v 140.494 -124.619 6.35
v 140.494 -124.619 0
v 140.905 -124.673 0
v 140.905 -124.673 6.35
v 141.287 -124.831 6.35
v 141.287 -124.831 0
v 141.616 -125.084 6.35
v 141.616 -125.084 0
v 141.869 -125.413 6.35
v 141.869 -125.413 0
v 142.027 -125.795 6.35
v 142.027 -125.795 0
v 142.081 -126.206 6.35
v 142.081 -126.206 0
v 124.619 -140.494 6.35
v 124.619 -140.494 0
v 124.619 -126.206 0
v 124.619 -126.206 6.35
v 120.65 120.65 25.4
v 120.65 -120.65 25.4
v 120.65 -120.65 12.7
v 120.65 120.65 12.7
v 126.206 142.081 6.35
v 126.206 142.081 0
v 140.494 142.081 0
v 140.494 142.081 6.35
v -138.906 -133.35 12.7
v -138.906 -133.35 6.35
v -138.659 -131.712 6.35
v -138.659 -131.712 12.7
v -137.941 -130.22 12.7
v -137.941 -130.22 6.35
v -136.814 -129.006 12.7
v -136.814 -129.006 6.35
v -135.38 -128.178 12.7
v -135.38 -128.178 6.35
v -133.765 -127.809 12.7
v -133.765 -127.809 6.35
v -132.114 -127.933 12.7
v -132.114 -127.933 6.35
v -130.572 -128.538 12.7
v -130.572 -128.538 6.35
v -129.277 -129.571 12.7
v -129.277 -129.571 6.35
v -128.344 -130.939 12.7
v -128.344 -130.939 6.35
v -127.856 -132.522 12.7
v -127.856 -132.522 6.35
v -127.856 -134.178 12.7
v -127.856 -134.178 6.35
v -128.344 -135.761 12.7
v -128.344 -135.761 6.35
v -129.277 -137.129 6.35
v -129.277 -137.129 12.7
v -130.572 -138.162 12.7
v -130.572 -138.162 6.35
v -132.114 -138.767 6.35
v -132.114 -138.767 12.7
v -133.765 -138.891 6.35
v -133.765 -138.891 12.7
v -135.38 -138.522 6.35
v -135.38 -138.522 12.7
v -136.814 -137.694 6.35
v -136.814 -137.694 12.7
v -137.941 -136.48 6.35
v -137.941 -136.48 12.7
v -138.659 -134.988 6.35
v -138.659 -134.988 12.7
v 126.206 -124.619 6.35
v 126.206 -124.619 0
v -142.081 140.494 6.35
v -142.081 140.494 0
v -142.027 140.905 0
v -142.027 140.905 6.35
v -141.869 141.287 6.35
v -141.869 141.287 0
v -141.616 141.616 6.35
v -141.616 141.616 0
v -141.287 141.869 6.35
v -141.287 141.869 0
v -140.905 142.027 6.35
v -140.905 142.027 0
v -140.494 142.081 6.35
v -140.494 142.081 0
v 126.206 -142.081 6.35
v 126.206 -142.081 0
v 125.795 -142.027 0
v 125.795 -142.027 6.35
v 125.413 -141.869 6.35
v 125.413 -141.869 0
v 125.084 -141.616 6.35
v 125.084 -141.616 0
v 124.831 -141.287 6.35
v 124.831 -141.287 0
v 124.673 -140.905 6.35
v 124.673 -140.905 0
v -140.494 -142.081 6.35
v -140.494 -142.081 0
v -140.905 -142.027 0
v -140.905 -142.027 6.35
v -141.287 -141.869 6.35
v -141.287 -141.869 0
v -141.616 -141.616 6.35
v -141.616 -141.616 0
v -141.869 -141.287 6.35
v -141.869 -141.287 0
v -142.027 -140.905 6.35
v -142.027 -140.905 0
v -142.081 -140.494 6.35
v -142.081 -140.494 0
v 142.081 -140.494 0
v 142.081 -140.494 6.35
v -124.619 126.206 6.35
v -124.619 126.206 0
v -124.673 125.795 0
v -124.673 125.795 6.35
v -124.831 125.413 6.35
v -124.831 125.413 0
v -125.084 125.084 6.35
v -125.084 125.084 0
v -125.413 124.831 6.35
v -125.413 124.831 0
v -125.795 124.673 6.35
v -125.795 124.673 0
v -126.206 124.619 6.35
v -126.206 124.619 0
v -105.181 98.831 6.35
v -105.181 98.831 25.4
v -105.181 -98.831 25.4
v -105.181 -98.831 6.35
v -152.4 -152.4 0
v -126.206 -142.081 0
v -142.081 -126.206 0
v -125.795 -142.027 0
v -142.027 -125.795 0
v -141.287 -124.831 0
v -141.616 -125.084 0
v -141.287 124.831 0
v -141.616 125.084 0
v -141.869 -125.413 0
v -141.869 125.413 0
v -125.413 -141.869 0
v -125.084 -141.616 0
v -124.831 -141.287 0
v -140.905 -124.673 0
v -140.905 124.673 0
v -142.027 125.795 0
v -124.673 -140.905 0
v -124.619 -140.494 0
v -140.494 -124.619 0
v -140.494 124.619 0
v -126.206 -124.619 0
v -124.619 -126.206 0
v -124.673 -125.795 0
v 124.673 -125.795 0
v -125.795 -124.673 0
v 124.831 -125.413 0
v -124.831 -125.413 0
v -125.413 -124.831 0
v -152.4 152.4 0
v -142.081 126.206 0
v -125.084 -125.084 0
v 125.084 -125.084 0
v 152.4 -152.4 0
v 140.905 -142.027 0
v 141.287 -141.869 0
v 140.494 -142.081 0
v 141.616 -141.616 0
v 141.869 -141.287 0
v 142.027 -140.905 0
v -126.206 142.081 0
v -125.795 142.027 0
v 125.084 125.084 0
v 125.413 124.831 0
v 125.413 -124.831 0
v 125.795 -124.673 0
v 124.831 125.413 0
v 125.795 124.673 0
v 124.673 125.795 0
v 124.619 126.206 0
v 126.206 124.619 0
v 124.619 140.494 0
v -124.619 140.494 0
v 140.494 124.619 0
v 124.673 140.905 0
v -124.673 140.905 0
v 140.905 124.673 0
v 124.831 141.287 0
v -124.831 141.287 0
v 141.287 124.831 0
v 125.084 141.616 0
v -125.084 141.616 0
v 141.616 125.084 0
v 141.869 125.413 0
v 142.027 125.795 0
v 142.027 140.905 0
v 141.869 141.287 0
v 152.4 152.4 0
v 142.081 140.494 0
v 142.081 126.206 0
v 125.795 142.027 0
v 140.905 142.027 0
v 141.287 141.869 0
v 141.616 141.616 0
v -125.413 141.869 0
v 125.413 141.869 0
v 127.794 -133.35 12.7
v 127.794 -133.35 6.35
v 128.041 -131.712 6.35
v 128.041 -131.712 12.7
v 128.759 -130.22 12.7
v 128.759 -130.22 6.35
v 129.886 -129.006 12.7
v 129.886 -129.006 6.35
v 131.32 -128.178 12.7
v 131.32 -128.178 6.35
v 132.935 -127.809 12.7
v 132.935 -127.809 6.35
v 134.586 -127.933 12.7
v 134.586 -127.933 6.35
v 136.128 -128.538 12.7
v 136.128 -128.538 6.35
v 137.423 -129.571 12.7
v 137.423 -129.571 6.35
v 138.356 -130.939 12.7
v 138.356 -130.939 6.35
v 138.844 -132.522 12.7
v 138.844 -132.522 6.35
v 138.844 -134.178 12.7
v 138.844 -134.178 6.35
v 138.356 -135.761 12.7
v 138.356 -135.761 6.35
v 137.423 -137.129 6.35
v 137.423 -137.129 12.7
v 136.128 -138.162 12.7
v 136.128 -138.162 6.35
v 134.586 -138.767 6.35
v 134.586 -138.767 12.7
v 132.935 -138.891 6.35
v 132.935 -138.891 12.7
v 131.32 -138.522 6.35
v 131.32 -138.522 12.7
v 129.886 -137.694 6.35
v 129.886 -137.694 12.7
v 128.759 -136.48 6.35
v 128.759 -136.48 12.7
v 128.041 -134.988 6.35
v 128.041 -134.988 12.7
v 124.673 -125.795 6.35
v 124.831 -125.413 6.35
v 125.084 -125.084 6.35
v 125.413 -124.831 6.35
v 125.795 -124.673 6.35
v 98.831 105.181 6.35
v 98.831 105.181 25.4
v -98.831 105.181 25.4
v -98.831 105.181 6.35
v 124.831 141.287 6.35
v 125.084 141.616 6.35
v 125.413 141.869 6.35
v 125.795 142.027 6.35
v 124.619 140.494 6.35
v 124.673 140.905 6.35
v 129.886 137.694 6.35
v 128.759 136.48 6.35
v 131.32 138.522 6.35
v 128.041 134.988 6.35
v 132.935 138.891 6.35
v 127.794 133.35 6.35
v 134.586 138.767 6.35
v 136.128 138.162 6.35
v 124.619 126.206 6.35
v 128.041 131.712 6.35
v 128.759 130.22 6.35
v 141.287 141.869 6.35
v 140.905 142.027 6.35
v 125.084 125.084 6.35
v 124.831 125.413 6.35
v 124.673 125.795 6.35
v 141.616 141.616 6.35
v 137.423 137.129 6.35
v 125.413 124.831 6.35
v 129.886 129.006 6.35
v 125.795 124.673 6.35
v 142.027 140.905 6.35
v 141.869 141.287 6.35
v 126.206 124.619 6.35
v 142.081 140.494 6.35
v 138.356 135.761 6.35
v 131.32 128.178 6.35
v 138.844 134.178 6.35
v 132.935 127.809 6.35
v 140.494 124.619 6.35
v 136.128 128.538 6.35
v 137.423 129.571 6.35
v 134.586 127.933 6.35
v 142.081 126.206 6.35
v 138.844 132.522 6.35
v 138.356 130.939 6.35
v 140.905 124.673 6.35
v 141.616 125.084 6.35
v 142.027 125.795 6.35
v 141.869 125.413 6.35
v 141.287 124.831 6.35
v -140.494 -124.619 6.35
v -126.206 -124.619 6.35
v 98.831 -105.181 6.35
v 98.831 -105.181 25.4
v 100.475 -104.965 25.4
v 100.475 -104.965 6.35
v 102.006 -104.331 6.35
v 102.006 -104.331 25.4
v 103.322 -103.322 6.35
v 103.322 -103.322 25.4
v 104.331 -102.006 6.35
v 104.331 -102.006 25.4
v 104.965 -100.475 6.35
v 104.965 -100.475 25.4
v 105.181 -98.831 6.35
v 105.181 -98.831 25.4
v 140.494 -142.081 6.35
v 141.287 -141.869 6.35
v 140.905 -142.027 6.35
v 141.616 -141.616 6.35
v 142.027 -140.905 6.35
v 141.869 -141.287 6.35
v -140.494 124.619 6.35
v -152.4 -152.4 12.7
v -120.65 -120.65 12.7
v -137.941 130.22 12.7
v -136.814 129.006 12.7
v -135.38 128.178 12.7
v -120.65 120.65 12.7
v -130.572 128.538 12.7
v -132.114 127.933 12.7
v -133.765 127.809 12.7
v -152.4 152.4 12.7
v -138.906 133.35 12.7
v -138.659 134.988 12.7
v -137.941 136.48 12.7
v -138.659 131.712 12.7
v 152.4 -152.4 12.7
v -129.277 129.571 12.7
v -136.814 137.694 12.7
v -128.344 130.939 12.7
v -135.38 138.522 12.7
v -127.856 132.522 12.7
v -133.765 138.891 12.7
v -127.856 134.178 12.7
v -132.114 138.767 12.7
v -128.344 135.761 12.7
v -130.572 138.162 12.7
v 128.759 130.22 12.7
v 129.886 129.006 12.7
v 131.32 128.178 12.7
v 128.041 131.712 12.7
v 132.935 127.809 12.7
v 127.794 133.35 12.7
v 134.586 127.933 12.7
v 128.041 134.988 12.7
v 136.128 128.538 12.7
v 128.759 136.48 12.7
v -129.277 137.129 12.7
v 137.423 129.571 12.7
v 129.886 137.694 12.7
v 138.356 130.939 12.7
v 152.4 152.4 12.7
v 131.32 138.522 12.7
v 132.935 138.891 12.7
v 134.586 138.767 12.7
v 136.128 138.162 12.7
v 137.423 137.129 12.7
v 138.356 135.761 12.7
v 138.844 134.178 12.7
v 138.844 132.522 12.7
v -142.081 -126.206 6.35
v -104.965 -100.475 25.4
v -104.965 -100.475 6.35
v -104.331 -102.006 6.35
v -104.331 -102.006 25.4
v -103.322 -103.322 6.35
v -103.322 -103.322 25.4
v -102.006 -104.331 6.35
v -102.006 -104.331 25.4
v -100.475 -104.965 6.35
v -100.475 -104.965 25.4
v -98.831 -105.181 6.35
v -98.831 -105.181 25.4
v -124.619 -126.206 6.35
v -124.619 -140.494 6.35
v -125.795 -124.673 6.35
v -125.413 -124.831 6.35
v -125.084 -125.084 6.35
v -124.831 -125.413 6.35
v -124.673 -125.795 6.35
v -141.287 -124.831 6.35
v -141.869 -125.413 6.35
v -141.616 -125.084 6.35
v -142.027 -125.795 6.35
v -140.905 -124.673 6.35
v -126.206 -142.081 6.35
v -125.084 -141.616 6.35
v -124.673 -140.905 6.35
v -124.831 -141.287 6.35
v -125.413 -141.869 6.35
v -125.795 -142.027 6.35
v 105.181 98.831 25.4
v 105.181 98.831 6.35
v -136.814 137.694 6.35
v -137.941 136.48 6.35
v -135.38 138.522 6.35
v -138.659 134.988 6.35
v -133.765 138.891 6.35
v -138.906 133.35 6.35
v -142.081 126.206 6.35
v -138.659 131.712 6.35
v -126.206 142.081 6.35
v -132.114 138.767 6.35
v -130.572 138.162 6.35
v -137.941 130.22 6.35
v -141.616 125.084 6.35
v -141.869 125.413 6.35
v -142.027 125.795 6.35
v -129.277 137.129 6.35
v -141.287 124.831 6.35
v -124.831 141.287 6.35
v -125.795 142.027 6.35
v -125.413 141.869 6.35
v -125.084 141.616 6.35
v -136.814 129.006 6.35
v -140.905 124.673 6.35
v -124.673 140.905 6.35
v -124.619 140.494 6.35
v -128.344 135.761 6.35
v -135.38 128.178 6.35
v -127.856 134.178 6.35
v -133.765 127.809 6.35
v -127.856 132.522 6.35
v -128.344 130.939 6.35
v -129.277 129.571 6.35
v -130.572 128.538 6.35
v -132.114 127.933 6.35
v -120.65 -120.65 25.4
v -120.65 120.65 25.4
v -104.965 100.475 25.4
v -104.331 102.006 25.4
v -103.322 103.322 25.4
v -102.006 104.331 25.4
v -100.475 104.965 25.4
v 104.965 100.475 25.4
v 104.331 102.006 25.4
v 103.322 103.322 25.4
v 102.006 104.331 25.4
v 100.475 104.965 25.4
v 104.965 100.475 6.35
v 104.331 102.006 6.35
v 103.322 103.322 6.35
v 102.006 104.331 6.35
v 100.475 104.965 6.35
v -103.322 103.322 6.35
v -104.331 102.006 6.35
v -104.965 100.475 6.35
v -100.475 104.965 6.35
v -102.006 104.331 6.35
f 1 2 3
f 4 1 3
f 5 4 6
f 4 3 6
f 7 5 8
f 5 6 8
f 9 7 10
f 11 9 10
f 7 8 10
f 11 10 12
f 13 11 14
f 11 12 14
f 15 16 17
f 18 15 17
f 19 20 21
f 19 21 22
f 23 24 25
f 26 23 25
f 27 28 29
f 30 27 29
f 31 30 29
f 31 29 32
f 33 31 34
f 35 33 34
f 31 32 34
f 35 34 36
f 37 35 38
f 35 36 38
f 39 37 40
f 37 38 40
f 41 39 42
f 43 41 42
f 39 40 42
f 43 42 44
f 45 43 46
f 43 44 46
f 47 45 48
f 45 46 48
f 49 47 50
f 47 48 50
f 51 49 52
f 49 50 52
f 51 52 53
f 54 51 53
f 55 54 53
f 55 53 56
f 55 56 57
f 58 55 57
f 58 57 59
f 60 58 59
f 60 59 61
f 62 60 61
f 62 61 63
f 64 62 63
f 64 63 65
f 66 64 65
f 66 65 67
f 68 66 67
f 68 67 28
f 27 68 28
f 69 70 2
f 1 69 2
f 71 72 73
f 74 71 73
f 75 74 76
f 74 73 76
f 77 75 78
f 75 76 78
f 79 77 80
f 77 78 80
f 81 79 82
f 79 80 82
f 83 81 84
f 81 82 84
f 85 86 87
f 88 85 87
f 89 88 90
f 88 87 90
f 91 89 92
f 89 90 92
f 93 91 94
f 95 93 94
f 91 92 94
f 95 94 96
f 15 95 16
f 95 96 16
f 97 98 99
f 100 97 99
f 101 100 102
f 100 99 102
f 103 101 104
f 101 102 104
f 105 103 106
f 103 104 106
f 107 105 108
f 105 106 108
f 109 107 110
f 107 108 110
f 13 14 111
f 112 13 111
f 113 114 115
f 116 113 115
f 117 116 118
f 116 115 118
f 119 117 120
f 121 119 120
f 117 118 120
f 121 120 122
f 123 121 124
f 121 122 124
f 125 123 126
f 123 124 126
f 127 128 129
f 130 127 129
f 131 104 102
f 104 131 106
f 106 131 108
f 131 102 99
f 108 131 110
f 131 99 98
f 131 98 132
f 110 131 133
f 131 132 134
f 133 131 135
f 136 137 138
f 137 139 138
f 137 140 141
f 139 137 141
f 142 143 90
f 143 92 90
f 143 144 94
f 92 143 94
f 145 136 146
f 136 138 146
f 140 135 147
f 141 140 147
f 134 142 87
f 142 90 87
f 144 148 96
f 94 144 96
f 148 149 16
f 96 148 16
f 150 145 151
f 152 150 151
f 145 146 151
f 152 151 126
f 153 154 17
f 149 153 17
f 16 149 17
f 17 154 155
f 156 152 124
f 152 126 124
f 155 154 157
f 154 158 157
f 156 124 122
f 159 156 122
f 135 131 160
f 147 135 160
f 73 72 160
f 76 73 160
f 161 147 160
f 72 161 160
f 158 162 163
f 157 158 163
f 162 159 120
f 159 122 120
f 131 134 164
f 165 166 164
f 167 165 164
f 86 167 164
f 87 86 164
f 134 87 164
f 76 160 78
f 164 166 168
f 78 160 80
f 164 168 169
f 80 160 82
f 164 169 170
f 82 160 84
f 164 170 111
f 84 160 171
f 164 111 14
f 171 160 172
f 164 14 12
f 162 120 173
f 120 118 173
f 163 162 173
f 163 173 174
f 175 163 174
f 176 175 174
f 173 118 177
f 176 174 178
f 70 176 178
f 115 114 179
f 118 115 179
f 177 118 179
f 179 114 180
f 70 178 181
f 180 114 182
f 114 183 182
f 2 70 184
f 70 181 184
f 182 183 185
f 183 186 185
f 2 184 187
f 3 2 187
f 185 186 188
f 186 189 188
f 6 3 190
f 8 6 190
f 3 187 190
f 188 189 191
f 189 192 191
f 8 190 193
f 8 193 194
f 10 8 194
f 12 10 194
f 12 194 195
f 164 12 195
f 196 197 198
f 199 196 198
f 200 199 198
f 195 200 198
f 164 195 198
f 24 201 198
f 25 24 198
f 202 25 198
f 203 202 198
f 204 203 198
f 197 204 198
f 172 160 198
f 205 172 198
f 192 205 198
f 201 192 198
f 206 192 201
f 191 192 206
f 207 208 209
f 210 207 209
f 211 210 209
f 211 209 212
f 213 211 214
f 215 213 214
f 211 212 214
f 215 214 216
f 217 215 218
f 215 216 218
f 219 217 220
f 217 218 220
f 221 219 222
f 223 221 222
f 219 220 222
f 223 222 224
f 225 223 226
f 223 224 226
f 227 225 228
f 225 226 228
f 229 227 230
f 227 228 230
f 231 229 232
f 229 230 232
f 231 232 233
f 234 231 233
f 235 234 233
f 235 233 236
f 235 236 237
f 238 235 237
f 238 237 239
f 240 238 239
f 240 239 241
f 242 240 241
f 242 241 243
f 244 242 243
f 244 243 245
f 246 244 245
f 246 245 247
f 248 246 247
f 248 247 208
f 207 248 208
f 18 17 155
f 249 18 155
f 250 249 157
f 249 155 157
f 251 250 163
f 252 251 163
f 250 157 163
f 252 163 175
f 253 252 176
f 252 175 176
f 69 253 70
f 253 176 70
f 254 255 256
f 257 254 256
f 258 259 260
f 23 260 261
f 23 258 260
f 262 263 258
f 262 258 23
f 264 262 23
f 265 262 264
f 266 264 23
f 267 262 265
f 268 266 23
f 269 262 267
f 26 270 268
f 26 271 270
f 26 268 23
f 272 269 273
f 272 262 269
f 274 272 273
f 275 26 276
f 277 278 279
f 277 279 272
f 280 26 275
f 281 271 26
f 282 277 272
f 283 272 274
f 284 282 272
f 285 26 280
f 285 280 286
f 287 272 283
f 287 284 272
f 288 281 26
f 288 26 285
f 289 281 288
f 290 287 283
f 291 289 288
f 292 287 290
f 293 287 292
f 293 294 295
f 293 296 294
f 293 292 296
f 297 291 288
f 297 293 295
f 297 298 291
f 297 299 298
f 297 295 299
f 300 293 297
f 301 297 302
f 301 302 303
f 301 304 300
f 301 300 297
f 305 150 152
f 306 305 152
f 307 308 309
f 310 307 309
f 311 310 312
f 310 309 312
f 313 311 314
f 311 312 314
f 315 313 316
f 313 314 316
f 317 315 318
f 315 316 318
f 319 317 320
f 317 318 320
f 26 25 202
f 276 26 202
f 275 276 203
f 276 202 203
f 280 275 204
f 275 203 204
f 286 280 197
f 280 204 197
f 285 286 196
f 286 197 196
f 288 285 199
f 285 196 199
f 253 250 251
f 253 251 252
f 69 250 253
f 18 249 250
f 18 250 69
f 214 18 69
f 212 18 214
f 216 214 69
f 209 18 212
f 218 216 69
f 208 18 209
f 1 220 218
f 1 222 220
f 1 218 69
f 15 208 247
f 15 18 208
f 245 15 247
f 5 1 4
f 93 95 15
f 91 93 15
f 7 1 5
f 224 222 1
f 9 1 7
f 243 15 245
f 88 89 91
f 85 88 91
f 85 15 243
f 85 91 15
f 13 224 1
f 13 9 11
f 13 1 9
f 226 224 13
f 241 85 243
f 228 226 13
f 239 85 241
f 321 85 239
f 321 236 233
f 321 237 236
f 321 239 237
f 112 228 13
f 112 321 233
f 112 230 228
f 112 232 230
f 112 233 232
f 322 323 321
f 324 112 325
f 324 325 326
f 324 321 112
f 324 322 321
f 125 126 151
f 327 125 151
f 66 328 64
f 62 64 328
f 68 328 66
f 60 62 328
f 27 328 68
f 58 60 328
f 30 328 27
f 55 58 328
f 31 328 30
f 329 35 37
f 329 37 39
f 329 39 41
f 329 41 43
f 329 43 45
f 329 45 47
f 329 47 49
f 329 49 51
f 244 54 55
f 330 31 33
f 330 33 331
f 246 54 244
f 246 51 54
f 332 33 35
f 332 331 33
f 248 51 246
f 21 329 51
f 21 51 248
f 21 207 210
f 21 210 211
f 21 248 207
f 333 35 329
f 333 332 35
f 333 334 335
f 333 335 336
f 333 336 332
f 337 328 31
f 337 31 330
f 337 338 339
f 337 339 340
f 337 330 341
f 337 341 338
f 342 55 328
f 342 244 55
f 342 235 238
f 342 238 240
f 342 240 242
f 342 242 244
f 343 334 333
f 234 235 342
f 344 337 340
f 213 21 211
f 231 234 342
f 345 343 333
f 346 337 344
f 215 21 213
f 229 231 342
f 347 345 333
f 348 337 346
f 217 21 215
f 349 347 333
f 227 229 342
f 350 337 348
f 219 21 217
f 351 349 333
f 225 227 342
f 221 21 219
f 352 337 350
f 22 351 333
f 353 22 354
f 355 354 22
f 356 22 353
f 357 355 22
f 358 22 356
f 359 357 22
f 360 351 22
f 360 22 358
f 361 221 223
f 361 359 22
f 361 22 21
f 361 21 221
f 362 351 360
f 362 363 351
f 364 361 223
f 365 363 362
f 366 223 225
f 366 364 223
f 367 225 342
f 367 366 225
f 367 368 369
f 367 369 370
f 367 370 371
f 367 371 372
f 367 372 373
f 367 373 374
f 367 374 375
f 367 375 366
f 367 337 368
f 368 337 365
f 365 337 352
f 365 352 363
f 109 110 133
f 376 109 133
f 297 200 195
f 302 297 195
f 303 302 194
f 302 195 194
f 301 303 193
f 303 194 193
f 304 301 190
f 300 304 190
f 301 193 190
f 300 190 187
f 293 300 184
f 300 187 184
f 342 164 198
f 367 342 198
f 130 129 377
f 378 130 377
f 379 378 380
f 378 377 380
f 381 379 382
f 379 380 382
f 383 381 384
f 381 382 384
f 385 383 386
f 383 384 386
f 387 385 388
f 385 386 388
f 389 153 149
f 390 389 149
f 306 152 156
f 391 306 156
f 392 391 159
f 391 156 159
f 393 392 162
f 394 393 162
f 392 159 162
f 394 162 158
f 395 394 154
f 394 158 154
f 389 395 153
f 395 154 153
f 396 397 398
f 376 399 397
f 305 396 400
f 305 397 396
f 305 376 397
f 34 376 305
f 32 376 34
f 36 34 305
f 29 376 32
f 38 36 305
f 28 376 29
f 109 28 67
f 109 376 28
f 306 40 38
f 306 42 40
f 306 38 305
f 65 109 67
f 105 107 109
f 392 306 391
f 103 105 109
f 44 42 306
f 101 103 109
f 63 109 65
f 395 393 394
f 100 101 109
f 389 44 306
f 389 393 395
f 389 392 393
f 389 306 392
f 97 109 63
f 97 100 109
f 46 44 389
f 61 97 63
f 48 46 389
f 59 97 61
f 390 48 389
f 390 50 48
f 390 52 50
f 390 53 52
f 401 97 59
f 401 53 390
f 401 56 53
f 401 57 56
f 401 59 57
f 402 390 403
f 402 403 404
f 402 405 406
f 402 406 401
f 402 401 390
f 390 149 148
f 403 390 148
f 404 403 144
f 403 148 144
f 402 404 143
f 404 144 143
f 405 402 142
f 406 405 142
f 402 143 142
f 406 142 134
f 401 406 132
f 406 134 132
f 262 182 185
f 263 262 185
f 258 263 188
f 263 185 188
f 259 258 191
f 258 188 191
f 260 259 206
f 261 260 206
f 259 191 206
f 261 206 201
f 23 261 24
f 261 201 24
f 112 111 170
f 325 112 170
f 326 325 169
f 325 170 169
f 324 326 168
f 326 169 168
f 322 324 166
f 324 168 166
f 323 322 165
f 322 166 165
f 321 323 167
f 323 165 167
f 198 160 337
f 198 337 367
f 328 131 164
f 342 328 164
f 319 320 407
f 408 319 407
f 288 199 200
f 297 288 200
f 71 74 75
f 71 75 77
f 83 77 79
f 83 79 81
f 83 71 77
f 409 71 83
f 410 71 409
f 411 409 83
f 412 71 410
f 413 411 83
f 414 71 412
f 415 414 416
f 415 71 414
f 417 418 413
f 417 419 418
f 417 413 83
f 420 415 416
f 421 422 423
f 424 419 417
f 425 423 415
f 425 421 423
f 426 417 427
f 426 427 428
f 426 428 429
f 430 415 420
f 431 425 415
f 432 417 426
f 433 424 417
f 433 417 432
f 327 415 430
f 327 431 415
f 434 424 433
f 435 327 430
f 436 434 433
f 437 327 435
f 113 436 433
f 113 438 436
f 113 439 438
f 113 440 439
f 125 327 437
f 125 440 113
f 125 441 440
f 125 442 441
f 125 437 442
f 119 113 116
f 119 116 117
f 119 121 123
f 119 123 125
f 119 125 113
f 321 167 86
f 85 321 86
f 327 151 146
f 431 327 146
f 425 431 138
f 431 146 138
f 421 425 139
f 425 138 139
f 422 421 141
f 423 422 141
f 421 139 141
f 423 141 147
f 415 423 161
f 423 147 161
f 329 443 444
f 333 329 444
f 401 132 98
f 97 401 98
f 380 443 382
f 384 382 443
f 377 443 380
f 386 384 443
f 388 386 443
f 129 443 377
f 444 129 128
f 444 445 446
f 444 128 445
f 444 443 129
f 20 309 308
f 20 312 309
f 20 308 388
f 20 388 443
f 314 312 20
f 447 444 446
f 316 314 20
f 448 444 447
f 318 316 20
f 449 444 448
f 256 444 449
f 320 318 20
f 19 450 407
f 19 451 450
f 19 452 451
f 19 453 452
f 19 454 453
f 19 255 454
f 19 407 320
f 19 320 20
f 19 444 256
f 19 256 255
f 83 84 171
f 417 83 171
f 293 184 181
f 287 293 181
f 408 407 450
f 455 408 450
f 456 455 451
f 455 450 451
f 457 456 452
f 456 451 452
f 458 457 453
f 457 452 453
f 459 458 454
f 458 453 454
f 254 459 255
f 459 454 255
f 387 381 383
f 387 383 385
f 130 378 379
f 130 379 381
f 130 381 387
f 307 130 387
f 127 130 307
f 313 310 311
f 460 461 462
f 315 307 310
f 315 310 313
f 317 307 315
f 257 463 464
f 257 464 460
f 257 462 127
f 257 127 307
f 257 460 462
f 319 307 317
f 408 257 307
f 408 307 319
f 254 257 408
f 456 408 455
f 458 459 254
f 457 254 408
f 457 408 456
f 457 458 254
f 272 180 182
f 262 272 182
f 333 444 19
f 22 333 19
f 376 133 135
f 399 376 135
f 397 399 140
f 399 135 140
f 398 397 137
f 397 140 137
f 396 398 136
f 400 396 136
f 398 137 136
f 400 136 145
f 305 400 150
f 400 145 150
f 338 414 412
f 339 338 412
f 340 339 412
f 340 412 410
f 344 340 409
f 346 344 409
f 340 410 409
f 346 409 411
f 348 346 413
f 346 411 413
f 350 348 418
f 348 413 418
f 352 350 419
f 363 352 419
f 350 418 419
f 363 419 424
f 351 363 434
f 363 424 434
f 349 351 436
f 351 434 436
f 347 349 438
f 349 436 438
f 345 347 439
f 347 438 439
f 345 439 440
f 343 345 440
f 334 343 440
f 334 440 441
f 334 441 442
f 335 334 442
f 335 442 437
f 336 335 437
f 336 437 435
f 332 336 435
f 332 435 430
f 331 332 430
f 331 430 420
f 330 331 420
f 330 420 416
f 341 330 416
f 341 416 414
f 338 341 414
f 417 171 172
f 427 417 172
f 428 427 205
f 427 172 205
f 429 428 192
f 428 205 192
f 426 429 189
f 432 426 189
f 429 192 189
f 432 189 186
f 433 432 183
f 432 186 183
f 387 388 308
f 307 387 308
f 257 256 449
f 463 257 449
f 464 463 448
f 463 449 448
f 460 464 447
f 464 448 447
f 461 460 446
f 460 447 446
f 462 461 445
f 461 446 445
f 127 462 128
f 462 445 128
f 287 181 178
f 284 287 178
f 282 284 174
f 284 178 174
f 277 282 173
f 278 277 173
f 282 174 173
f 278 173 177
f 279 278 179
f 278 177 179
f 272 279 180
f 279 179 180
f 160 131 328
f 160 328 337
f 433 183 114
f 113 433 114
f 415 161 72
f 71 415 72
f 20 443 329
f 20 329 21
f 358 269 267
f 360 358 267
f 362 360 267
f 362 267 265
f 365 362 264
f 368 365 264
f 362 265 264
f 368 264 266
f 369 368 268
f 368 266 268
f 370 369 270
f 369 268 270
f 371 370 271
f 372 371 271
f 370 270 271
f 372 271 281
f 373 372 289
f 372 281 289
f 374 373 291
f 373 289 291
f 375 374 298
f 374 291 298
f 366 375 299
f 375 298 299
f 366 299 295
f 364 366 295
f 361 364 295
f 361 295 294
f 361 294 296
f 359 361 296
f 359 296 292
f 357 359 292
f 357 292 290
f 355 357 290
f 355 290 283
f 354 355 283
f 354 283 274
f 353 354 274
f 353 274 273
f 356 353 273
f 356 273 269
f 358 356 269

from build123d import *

# Parameters (mm, degrees)
F0_W     = 304.8
F0_H     = 304.8
F1_DEPTH = 25.4
F3_DEPTH = 19.05
F4_W     = 304.8
F4_H     = 304.8
F4_W_2   = 241.3
F4_H_2   = 241.3
F5_DEPTH = 12.7
F7_D     = 11.1125
F9_DEPTH = 6.35


with BuildPart() as f1:
    # F0 (on Top) → F1 (new body)
    with BuildSketch(Plane.XY):
        Rectangle(F0_W, F0_H)
    extrude(amount=F1_DEPTH)

    # F2 (on face) → F3 (cut)
    with BuildSketch(Plane.XY.offset(25.4)):
        with BuildLine():
            Line((98.8314, 105.1814), (-98.8314, 105.1814))
            ThreePointArc((-98.8314, 105.1814), (-103.321528, 103.321528), (-105.1814, 98.8314))
            Line((-105.1814, 98.8314), (-105.1814, -98.8314))
            ThreePointArc((-105.1814, -98.8314), (-103.321528, -103.321528), (-98.8314, -105.1814))
            Line((-98.8314, -105.1814), (98.8314, -105.1814))
            ThreePointArc((98.8314, -105.1814), (103.321528, -103.321528), (105.1814, -98.8314))
            Line((105.1814, -98.8314), (105.1814, 98.8314))
            ThreePointArc((105.1814, 98.8314), (103.321528, 103.321528), (98.8314, 105.1814))
        make_face()
    extrude(amount=-F3_DEPTH, mode=Mode.SUBTRACT)

    # F4 (on face) → F5 (cut)
    with BuildSketch(Plane.XY.offset(25.4)):
        Rectangle(F4_W, F4_H)
        Rectangle(F4_W_2, F4_H_2, mode=Mode.SUBTRACT)
    extrude(amount=-F5_DEPTH, mode=Mode.SUBTRACT)

    # F7 (through all)
    with Locations(Plane.XY.offset(12.7)):
        with Locations((-133.35, 133.35), (133.35, 133.35), (133.35, -133.35), (-133.35, -133.35)):
            Hole(F7_D / 2)

    # F8 (on face) → F9 (cut)
    with BuildSketch(Plane(origin=(0, 0, 0), x_dir=(1, 0, 0), z_dir=(0, 0, -1))):
        with BuildLine():
            Line((-140.49375, 124.61875), (-126.20625, 124.61875))
            ThreePointArc((-126.20625, 124.61875), (-125.083718, 125.083718), (-124.61875, 126.20625))
            Line((-124.61875, 126.20625), (-124.61875, 140.49375))
            ThreePointArc((-124.61875, 140.49375), (-125.083718, 141.616282), (-126.20625, 142.08125))
            Line((-126.20625, 142.08125), (-140.49375, 142.08125))
            ThreePointArc((-140.49375, 142.08125), (-141.616282, 141.616282), (-142.08125, 140.49375))
            Line((-142.08125, 140.49375), (-142.08125, 126.20625))
            ThreePointArc((-142.08125, 126.20625), (-141.616282, 125.083718), (-140.49375, 124.61875))
        make_face()
        with BuildLine():
            ThreePointArc((124.61875, 126.20625), (125.083718, 125.083718), (126.20625, 124.61875))
            Line((126.20625, 124.61875), (140.49375, 124.61875))
            ThreePointArc((140.49375, 124.61875), (141.616282, 125.083718), (142.08125, 126.20625))
            Line((142.08125, 126.20625), (142.08125, 140.49375))
            ThreePointArc((142.08125, 140.49375), (141.616282, 141.616282), (140.49375, 142.08125))
            Line((140.49375, 142.08125), (126.20625, 142.08125))
            ThreePointArc((126.20625, 142.08125), (125.083718, 141.616282), (124.61875, 140.49375))
            Line((124.61875, 140.49375), (124.61875, 126.20625))
        make_face()
        with BuildLine():
            ThreePointArc((124.61875, -140.49375), (125.083718, -141.616282), (126.20625, -142.08125))
            Line((126.20625, -142.08125), (140.49375, -142.08125))
            ThreePointArc((140.49375, -142.08125), (141.616282, -141.616282), (142.08125, -140.49375))
            Line((142.08125, -140.49375), (142.08125, -126.20625))
            ThreePointArc((142.08125, -126.20625), (141.616282, -125.083718), (140.49375, -124.61875))
            Line((140.49375, -124.61875), (126.20625, -124.61875))
            ThreePointArc((126.20625, -124.61875), (125.083718, -125.083718), (124.61875, -126.20625))
            Line((124.61875, -126.20625), (124.61875, -140.49375))
        make_face()
        with BuildLine():
            Line((-140.49375, -142.08125), (-126.20625, -142.08125))
            ThreePointArc((-126.20625, -142.08125), (-125.083718, -141.616282), (-124.61875, -140.49375))
            Line((-124.61875, -140.49375), (-124.61875, -126.20625))
            ThreePointArc((-124.61875, -126.20625), (-125.083718, -125.083718), (-126.20625, -124.61875))
            Line((-126.20625, -124.61875), (-140.49375, -124.61875))
            ThreePointArc((-140.49375, -124.61875), (-141.616282, -125.083718), (-142.08125, -126.20625))
            Line((-142.08125, -126.20625), (-142.08125, -140.49375))
            ThreePointArc((-142.08125, -140.49375), (-141.616282, -141.616282), (-140.49375, -142.08125))
        make_face()
    extrude(amount=-F9_DEPTH, mode=Mode.SUBTRACT)


solid = f1.part
